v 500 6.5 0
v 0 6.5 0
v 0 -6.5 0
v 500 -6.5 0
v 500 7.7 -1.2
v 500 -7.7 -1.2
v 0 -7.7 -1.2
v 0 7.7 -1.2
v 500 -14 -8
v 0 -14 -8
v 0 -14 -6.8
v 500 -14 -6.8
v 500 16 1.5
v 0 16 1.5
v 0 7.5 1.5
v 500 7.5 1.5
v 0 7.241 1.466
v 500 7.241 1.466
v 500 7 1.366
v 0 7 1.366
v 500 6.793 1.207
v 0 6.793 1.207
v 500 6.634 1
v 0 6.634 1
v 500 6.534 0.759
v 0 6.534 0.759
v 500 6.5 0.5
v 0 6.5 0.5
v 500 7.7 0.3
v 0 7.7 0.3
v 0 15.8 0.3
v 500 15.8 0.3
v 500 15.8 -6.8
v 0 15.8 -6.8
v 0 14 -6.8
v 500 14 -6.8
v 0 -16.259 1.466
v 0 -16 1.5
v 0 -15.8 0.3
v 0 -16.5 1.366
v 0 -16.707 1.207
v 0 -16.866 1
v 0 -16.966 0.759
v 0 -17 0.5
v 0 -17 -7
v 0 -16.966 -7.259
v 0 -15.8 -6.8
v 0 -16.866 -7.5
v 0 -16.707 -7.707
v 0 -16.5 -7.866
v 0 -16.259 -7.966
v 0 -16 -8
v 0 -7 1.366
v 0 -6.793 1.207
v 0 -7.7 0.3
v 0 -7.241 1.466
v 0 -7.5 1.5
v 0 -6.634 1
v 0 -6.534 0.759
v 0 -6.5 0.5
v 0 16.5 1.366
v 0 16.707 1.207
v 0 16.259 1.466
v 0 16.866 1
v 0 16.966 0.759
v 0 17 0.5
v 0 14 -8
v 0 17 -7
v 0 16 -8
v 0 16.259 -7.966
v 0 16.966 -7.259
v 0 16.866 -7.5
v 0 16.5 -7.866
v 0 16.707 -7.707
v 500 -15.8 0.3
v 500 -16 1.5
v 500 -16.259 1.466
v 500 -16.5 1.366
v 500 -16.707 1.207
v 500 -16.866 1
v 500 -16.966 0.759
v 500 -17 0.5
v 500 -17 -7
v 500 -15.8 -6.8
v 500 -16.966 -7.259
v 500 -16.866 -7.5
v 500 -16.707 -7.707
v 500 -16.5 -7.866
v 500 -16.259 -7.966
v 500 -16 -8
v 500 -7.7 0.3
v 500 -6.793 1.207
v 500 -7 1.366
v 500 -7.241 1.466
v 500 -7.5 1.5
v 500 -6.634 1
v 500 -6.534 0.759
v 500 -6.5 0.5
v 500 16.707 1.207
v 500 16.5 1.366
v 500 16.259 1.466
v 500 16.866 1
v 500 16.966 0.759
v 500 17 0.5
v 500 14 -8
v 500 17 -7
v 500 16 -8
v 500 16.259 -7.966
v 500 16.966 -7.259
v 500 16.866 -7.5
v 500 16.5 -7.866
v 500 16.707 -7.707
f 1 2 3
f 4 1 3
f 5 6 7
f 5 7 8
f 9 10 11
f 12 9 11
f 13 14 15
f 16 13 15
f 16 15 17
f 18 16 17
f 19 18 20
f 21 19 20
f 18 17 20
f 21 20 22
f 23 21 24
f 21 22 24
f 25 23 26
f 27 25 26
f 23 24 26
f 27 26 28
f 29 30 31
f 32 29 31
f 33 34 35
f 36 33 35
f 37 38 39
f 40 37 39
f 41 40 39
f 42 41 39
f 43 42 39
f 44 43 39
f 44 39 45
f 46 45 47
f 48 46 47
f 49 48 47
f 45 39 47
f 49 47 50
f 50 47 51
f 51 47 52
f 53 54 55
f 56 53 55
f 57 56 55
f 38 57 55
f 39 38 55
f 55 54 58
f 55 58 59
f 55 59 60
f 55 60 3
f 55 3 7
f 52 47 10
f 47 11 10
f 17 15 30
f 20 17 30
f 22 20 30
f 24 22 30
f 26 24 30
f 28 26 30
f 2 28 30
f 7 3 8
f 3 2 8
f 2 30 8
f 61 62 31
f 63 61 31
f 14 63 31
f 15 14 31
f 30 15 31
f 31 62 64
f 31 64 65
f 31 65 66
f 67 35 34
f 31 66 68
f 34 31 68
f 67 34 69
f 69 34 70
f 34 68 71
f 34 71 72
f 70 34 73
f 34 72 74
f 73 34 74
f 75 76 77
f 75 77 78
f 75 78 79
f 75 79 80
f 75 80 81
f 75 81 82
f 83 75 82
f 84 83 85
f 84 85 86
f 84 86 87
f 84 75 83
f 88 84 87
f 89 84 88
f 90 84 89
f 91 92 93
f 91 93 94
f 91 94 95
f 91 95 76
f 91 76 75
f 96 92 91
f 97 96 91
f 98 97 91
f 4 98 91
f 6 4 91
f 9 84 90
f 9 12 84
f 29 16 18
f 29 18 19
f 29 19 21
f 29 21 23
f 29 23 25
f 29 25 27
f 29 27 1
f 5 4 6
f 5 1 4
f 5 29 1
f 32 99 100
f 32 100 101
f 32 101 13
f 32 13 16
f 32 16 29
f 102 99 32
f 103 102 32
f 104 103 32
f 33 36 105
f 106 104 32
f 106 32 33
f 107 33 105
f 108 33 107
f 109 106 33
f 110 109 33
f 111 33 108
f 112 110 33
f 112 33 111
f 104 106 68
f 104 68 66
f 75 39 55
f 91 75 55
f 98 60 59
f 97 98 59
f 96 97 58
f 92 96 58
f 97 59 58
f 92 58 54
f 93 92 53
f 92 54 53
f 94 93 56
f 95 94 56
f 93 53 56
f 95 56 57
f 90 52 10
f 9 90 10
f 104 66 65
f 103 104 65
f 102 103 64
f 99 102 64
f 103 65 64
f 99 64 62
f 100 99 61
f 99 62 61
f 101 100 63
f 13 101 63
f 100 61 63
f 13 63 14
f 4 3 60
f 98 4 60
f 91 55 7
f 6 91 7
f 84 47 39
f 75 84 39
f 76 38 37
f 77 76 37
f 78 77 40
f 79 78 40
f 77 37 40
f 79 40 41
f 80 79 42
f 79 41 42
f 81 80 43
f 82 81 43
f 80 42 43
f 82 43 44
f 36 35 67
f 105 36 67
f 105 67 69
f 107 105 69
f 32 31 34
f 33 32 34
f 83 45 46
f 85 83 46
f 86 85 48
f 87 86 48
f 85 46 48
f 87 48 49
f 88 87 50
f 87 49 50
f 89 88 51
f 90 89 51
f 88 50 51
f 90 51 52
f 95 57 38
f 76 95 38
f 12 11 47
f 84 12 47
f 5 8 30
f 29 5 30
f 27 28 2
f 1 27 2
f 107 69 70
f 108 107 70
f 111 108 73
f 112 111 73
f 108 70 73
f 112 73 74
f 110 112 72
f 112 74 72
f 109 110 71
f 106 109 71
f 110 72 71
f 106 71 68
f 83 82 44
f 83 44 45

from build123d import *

# Parameters (mm, degrees)
EXTRUDE_3_DEPTH = 500


with BuildPart() as part:
    # Эскиз1 → Вытянуть-Тонкостенный3 (new body)
    with BuildSketch(Plane(origin=(0, 0, 0), x_dir=(0, 0, -1), z_dir=(1, 0, 0))):
        with BuildLine():
            Line((8, 14), (8, 16))
            ThreePointArc((8, 16), (7.707106781, 16.707106781), (7, 17))
            Line((7, 17), (-0.5, 17))
            ThreePointArc((-0.5, 17), (-1.207106781, 16.707106781), (-1.5, 16))
            Line((-1.5, 16), (-1.5, 7.5))
            ThreePointArc((-1.5, 7.5), (-1.207106781, 6.792893219), (-0.5, 6.5))
            Line((-0.5, 6.5), (0, 6.5))
            Line((0, 6.5), (0, -6.5))
            Line((0, -6.5), (-0.5, -6.5))
            ThreePointArc((-0.5, -6.5), (-1.207106781, -6.792893219), (-1.5, -7.5))
            Line((-1.5, -7.5), (-1.5, -16))
            ThreePointArc((-1.5, -16), (-1.207106781, -16.707106781), (-0.5, -17))
            Line((-0.5, -17), (7, -17))
            ThreePointArc((7, -17), (7.707106781, -16.707106781), (8, -16))
            Line((8, -16), (8, -14))
            Line((8, -14), (6.8, -14))
            Line((6.8, -14), (6.8, -15.8))
            Line((6.8, -15.8), (-0.3, -15.8))
            Line((-0.3, -15.8), (-0.3, -7.7))
            Line((-0.3, -7.7), (1.2, -7.7))
            Line((1.2, -7.7), (1.2, 7.7))
            Line((1.2, 7.7), (-0.3, 7.7))
            Line((-0.3, 7.7), (-0.3, 15.8))
            Line((-0.3, 15.8), (6.8, 15.8))
            Line((6.8, 15.8), (6.8, 14))
            Line((6.8, 14), (8, 14))
        make_face()
    extrude(amount=EXTRUDE_3_DEPTH)


solid = part.part
